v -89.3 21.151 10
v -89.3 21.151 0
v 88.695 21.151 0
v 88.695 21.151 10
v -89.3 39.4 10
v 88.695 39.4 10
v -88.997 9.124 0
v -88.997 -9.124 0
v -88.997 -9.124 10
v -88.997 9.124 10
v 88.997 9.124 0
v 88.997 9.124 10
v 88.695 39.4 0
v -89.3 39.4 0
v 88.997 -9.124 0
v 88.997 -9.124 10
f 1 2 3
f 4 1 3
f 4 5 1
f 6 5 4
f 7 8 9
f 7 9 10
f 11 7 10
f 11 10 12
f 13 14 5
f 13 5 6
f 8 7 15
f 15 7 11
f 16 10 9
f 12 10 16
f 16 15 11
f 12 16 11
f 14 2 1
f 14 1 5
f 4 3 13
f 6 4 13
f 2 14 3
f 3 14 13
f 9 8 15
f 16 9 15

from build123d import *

# Parameters (mm, degrees)
F0_W     = 177.994654
F0_H     = 18.248664
F1_DEPTH = 10


with BuildPart() as f1:
    # F0 (on Top) → F1 (new body)
    with BuildSketch(Plane.XY):
        Rectangle(F0_W, F0_H)
        with Locations((-0.302673, 30.275668)):
            Rectangle(F0_W, F0_H)
    extrude(amount=F1_DEPTH)


solid = f1.part
